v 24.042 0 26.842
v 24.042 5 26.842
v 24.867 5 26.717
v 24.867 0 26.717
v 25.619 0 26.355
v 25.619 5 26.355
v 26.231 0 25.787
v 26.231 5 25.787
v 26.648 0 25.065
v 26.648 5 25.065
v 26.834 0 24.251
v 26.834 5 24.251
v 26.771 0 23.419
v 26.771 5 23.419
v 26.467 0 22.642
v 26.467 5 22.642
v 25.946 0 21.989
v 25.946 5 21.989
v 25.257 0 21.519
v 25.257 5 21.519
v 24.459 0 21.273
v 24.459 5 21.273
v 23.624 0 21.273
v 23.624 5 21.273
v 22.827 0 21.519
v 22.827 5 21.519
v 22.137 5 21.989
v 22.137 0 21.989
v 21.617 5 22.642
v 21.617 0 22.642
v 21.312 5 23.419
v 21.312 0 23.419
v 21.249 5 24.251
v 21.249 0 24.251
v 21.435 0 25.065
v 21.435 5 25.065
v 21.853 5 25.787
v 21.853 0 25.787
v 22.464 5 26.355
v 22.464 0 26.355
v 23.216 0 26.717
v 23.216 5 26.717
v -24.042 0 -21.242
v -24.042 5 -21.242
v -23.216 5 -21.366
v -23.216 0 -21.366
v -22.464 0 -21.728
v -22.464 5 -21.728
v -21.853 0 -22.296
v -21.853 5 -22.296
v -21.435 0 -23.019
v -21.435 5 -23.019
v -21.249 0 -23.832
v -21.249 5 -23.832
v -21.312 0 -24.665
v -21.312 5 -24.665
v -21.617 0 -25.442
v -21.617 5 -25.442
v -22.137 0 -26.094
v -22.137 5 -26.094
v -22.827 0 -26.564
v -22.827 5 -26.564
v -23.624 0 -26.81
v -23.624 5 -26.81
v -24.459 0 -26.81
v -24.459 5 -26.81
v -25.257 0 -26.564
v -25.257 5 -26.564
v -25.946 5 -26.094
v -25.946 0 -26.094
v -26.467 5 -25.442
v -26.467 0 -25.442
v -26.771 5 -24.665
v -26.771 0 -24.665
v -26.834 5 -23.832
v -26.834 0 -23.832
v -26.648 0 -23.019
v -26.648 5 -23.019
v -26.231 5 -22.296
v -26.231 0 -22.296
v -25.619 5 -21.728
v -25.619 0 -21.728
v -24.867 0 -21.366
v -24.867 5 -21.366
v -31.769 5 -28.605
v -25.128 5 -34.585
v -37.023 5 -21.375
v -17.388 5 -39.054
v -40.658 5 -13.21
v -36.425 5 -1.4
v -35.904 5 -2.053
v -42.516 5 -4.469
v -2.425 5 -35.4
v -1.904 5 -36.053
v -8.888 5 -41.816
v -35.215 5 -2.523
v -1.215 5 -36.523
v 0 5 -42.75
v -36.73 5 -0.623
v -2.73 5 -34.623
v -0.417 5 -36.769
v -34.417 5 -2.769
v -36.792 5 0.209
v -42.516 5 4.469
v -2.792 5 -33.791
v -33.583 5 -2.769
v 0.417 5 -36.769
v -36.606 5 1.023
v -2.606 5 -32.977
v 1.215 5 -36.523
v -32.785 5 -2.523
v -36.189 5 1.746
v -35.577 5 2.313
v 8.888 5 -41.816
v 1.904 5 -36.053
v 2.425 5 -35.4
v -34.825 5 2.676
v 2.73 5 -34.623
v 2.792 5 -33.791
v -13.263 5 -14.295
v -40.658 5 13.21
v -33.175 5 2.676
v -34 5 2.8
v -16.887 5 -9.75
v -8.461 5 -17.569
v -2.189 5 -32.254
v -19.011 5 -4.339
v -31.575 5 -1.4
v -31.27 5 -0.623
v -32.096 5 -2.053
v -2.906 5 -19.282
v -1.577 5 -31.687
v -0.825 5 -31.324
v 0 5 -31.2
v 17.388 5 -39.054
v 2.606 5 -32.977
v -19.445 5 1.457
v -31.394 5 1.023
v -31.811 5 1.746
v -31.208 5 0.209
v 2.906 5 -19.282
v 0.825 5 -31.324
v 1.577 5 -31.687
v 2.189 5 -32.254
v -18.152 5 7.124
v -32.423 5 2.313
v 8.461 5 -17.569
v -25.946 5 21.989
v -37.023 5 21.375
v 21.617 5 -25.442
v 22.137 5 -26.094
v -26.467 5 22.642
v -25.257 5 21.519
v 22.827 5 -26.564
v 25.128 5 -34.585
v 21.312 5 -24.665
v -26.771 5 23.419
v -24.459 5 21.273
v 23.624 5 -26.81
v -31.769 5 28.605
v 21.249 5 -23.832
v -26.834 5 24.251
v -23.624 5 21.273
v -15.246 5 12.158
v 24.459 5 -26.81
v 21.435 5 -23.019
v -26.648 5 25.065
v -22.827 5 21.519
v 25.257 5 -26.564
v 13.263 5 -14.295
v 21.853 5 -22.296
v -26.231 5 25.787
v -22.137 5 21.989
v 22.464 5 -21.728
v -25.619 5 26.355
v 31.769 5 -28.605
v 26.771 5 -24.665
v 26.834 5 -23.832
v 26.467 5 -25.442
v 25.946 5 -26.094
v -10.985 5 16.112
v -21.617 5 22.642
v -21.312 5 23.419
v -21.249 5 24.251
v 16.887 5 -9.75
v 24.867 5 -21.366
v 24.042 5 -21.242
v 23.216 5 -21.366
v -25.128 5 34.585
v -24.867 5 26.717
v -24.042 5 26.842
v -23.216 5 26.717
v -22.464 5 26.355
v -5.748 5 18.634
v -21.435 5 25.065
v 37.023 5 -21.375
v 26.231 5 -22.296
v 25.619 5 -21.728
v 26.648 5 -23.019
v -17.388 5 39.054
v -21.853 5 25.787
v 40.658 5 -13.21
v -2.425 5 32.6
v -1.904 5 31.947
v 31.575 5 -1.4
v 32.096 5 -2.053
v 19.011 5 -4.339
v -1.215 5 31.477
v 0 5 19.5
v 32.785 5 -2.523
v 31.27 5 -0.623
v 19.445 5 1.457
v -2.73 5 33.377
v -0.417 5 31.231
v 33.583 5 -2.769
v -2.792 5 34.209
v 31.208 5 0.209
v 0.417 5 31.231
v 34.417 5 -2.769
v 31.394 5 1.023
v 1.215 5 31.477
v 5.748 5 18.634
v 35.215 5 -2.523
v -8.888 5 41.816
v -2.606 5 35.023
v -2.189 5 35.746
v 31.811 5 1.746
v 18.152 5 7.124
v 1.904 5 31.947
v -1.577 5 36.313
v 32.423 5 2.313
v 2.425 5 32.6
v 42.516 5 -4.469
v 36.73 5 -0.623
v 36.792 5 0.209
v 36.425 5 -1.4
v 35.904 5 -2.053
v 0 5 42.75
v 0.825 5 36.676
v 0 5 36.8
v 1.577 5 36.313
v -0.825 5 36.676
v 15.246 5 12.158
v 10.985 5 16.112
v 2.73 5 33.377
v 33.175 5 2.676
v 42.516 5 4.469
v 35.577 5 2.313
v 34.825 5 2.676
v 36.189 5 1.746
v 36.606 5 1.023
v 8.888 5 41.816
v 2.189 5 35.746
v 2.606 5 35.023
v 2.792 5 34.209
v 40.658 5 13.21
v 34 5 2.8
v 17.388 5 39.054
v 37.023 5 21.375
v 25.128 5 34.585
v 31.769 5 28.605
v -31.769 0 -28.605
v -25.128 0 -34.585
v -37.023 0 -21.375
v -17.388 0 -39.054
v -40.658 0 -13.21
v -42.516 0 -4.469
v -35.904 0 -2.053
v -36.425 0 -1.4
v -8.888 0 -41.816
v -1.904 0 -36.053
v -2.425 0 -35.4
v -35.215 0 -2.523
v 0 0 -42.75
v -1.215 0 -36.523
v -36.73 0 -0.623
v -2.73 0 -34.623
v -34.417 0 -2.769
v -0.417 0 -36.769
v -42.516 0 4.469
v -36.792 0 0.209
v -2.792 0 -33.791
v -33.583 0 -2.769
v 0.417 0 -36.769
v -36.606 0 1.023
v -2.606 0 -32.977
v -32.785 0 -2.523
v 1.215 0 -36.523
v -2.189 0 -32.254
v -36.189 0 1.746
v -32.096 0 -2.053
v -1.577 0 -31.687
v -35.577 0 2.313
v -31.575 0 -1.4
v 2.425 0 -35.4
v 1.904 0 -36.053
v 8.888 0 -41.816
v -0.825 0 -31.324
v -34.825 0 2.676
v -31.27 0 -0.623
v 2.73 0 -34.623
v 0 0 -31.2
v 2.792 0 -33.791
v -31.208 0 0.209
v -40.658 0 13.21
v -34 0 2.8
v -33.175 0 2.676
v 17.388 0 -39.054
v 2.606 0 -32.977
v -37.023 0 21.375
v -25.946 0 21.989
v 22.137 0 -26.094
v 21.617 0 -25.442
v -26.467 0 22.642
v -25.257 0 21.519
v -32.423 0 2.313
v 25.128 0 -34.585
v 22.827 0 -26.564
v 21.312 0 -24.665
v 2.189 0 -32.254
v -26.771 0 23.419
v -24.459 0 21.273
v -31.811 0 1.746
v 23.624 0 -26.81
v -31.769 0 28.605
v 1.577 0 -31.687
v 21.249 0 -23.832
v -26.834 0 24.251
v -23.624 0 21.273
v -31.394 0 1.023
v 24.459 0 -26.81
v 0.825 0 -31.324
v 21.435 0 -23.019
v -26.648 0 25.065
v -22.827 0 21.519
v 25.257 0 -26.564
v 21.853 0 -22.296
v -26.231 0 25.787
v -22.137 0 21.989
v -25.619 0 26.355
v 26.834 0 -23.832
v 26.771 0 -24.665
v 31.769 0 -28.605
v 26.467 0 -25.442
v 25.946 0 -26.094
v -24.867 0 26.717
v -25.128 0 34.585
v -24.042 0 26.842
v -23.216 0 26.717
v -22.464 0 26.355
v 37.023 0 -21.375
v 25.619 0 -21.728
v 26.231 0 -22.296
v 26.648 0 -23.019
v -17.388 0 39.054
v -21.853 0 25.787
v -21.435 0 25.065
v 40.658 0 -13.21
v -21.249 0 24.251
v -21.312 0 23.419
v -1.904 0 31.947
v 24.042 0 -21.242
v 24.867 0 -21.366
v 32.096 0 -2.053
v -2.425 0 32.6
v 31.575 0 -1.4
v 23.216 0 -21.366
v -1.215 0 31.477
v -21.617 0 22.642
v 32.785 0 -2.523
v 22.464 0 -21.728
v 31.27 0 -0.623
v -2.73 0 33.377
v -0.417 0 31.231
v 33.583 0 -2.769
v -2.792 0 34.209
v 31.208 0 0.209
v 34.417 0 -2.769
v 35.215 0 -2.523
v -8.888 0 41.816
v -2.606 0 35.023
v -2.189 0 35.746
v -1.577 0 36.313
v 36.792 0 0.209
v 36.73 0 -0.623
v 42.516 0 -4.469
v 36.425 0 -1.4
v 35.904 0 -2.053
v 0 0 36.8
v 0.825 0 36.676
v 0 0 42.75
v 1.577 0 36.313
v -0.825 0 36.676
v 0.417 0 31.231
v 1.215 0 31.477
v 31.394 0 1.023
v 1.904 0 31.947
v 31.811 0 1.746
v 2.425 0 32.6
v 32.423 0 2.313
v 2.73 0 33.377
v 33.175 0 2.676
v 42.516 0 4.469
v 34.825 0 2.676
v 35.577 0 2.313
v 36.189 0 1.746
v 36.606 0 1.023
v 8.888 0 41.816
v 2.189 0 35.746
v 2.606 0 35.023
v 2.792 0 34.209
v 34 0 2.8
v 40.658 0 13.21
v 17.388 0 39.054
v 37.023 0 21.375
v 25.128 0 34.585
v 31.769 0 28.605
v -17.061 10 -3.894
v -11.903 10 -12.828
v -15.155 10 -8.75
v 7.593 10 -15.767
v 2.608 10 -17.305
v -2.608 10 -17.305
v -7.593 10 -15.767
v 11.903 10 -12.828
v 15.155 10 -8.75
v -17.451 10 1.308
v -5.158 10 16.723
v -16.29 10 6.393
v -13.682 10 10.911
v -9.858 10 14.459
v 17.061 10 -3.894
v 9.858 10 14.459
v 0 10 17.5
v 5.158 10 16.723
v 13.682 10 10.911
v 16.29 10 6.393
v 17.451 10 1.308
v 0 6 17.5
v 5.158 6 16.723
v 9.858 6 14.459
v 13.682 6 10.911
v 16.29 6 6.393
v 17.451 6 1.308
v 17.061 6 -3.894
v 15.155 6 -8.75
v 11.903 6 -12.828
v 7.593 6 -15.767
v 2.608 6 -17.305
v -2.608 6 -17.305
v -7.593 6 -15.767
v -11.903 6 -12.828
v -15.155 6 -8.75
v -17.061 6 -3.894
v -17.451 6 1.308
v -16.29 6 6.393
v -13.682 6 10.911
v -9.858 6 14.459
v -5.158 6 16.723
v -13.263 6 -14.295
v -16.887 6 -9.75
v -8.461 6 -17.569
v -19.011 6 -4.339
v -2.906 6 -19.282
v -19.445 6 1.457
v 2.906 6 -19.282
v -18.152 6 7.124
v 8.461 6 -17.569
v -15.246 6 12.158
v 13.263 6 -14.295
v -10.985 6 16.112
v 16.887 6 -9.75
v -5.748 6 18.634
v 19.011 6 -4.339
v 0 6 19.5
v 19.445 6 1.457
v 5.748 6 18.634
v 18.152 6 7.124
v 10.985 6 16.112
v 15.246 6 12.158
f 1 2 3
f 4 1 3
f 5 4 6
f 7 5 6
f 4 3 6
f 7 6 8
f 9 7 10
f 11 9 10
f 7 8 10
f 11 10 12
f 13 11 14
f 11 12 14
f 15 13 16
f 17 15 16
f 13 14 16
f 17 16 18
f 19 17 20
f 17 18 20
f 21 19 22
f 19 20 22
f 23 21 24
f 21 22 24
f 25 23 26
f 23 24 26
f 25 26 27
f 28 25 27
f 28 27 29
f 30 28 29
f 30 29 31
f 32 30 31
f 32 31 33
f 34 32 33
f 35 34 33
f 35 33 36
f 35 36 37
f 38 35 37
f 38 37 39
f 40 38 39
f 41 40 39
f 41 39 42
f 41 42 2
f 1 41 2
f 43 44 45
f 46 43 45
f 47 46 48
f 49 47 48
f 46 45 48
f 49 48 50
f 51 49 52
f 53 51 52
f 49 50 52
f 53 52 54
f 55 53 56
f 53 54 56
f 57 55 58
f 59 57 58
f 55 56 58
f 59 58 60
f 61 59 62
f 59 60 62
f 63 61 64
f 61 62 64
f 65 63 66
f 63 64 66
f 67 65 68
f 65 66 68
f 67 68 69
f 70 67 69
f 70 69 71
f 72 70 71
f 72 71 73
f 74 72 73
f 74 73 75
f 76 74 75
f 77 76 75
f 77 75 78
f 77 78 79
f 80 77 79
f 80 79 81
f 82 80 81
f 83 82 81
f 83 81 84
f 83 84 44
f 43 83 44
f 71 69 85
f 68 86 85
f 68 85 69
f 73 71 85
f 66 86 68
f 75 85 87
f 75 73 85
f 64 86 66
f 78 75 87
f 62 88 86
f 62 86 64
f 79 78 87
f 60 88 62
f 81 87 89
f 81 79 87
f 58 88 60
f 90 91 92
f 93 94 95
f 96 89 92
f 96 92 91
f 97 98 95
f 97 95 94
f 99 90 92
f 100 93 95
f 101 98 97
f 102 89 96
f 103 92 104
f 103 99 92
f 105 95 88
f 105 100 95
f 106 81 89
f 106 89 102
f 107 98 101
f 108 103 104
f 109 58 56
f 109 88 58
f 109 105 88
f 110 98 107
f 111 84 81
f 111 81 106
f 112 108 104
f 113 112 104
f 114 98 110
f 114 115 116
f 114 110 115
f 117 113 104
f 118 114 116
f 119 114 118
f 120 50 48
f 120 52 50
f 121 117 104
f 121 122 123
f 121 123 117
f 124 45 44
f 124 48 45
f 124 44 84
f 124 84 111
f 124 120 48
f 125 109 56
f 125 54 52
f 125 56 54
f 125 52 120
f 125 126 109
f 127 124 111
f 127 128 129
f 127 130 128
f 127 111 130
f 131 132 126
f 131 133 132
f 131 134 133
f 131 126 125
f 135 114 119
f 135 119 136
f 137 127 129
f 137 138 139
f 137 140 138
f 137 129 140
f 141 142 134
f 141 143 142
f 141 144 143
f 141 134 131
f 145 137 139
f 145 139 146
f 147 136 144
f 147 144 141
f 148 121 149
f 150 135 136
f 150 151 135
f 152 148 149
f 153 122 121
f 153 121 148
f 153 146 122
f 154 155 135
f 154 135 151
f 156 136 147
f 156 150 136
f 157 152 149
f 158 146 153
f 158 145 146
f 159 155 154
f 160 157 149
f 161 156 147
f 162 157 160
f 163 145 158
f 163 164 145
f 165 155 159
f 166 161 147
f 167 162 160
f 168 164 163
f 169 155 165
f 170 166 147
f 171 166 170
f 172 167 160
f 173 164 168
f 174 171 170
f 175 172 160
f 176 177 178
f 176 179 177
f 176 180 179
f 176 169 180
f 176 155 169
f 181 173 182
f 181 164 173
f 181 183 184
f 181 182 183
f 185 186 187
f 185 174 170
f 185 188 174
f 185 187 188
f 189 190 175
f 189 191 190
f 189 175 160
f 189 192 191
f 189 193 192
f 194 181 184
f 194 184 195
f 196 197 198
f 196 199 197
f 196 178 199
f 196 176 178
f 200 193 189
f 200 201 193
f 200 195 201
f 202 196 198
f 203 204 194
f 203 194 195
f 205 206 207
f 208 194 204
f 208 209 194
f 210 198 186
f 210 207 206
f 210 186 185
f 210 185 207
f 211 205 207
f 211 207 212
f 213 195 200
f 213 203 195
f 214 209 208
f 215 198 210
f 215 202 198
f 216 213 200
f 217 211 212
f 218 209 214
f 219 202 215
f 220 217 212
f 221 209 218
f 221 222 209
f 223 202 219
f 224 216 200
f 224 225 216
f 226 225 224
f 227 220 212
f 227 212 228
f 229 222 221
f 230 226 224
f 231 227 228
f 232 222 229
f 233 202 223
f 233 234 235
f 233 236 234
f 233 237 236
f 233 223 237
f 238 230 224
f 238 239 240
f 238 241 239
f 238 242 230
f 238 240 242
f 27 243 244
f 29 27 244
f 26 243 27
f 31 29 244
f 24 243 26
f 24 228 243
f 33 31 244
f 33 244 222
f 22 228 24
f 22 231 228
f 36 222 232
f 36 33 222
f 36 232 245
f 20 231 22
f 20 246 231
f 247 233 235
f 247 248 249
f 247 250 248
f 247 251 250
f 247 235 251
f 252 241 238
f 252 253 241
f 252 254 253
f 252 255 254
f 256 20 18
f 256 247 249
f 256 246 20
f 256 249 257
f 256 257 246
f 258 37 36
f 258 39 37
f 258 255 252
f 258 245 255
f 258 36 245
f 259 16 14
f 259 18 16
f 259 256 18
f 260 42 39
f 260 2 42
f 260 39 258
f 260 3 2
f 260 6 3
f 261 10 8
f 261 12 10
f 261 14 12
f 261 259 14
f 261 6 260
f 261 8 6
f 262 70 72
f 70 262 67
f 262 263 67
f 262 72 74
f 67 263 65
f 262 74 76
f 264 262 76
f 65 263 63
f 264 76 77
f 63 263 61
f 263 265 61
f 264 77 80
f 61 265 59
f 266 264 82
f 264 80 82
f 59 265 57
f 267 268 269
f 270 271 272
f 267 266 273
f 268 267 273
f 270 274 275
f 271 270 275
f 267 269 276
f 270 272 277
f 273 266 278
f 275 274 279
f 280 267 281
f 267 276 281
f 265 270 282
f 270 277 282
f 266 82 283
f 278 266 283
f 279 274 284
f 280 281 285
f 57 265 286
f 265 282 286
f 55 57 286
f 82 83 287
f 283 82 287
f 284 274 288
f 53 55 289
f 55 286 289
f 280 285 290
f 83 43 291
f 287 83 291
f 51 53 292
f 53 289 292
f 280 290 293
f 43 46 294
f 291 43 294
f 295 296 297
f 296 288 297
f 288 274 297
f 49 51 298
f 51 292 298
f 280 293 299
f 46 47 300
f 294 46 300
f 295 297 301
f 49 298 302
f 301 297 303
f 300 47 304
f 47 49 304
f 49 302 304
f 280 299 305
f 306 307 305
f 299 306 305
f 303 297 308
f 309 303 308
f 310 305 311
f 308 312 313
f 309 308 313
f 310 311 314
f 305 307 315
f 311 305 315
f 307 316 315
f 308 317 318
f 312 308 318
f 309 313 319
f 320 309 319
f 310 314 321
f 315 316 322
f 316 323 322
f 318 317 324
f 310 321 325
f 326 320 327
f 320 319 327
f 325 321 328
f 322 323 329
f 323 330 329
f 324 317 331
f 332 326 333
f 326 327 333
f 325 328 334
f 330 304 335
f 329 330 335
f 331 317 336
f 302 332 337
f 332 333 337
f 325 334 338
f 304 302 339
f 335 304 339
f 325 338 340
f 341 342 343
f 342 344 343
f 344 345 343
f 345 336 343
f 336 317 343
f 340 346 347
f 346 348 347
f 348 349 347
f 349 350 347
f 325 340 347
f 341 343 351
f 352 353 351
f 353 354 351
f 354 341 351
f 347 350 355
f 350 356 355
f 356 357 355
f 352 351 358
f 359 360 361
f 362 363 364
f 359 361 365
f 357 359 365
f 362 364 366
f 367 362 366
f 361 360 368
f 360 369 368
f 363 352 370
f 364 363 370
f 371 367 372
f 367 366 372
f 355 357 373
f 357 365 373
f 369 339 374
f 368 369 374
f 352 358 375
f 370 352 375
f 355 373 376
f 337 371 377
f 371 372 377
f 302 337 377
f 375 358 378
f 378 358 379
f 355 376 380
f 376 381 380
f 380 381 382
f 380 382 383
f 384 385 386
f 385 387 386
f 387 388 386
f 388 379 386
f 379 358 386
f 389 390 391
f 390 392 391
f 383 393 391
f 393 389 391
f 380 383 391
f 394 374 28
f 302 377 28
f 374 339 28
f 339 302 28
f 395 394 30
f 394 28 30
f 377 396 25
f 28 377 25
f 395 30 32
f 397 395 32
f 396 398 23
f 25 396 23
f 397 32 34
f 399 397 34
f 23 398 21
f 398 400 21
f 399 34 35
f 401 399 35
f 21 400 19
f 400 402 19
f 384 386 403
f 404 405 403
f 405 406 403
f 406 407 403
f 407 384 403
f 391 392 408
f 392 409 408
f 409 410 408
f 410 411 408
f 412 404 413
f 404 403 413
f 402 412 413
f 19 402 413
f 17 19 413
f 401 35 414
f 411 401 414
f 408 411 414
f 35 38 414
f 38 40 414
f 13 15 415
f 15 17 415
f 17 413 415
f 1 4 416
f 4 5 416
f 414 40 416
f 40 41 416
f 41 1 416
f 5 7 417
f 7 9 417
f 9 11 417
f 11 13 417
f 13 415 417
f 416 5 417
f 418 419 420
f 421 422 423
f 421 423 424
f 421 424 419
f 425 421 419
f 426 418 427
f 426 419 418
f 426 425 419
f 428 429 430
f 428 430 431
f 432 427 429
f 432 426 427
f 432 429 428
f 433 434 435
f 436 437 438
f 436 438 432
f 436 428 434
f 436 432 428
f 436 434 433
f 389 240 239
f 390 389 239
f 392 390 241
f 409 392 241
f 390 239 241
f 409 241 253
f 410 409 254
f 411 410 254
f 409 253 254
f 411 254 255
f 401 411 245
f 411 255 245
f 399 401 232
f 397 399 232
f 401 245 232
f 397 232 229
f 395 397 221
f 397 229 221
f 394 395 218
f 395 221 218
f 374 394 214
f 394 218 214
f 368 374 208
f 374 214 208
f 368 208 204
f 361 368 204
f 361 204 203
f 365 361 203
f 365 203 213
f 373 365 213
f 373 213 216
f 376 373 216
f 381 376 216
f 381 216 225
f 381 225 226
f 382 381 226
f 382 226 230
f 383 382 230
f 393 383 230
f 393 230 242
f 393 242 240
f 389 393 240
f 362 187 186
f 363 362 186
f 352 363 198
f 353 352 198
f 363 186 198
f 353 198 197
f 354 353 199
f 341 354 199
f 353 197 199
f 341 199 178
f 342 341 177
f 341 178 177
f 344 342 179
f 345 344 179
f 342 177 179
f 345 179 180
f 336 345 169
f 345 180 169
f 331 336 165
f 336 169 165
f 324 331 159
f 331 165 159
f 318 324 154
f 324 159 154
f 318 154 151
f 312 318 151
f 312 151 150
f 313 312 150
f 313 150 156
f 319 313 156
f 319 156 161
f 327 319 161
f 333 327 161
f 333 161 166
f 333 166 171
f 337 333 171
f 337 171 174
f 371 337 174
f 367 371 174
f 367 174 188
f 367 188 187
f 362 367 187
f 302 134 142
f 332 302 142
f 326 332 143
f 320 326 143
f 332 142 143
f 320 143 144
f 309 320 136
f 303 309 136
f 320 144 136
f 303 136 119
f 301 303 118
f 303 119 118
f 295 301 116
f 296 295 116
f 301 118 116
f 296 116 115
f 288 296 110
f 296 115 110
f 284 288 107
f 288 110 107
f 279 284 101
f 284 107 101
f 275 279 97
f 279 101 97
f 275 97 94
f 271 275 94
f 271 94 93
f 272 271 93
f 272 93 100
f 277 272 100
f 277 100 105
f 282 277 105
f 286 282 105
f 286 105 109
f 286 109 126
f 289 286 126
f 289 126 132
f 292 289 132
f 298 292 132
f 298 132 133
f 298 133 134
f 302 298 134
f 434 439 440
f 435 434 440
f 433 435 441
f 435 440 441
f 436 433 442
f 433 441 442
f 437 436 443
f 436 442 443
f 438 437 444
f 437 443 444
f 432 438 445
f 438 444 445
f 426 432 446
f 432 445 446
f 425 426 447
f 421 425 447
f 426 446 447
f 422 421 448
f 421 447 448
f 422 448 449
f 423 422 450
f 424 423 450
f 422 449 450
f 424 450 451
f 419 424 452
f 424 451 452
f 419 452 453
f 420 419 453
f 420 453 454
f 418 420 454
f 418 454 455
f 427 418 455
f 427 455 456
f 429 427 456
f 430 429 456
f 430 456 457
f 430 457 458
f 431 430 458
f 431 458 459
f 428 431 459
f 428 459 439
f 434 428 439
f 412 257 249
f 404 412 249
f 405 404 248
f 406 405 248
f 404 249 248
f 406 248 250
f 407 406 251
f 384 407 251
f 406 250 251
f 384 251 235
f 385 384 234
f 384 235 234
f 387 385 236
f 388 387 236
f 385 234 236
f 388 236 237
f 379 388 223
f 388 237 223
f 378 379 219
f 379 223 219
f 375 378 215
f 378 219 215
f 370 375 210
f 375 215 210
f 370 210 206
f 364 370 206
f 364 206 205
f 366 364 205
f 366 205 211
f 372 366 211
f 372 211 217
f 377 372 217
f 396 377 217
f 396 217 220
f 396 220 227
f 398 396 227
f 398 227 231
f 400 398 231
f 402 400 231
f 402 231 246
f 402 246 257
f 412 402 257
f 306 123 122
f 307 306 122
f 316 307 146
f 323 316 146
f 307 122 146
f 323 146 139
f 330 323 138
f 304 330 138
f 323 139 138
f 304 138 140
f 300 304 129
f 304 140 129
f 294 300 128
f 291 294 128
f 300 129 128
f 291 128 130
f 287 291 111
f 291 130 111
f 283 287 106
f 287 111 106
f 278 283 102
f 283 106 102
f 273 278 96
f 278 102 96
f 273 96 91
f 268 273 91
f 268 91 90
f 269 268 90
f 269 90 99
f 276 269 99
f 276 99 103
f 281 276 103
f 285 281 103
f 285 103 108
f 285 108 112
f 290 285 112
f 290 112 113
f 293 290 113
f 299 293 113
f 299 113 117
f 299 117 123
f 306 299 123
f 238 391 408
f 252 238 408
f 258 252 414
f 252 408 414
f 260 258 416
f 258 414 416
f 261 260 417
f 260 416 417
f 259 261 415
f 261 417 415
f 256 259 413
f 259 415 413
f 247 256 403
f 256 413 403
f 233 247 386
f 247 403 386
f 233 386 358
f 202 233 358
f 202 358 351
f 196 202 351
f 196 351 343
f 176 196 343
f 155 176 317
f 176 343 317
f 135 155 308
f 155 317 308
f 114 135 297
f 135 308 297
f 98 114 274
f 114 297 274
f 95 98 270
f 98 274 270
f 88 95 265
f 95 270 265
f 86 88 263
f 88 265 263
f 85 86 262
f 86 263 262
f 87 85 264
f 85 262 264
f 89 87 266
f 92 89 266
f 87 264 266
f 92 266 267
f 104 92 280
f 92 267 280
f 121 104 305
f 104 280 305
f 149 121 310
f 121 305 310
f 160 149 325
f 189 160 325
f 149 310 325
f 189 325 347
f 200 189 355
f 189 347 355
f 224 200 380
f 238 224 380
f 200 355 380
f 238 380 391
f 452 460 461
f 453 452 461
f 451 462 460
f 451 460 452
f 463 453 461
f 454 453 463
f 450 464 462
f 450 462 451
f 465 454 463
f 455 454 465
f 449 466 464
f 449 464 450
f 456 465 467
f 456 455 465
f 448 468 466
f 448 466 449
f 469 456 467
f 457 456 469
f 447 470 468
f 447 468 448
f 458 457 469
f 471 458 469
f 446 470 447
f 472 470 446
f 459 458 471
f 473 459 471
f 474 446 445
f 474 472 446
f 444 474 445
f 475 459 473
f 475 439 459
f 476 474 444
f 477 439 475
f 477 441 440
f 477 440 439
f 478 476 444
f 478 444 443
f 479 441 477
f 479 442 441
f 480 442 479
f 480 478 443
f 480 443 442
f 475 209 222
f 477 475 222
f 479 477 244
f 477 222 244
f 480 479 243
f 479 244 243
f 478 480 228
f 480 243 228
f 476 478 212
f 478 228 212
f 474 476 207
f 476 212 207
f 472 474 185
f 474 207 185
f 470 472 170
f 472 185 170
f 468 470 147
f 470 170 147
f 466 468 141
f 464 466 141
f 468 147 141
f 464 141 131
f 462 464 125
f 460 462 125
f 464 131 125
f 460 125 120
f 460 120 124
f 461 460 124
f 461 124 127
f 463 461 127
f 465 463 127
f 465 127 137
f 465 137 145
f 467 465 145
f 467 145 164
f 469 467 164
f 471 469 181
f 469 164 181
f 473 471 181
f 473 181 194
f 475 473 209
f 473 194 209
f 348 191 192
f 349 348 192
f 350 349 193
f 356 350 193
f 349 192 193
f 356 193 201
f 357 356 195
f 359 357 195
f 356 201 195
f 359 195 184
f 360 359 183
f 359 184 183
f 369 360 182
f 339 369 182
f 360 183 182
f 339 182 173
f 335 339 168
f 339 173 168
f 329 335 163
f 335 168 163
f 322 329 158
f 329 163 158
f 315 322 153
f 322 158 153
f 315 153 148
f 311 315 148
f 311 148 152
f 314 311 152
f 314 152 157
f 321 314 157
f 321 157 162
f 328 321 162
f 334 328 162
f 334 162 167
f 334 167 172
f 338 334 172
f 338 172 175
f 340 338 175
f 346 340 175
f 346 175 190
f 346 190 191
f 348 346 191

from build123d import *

# Parameters (mm, degrees)
SKETCH1_R           = 42.75
BOSS_EXTRUDE1_DEPTH = 5
SKETCH2_R           = 2.8
CUT_EXTRUDE1_DEPTH  = 61.664033826
SKETCH3_R           = 17.5
BOSS_EXTRUDE2_DEPTH = 5
SKETCH4_R           = 19.5
BOSS_EXTRUDE3_DEPTH = 1


with BuildPart() as part:
    # Sketch1 → Boss-Extrude1 (new body)
    with BuildSketch(Plane(origin=(0, 0, 0), x_dir=(1, 0, 0), z_dir=(0, 1, 0))):
        with Locations(Location((0, 0, 0), (0, 0, 270))):
            Circle(SKETCH1_R)
    extrude(amount=BOSS_EXTRUDE1_DEPTH)

    # Sketch2 → Cut-Extrude1 (cut, through all)
    with BuildSketch(Plane(origin=(0, 5, 0), x_dir=(1, 0, 0), z_dir=(0, 1, 0))):
        with Locations(Location((0, 34, 0), (0, 0, 270))):
            Circle(SKETCH2_R)
        with Locations(Location((24.04163056, 24.04163056, 0), (0, 0, 270))):
            Circle(SKETCH2_R)
        with Locations(Location((34, 0, 0), (0, 0, 270))):
            Circle(SKETCH2_R)
        with Locations(Location((24.04163056, -24.04163056, 0), (0, 0, 270))):
            Circle(SKETCH2_R)
        with Locations(Location((0, -34, 0), (0, 0, 270))):
            Circle(SKETCH2_R)
        with Locations(Location((-24.04163056, -24.04163056, 0), (0, 0, 270))):
            Circle(SKETCH2_R)
        with Locations(Location((-34, 0, 0), (0, 0, 270))):
            Circle(SKETCH2_R)
        with Locations(Location((-24.04163056, 24.04163056, 0), (0, 0, 270))):
            Circle(SKETCH2_R)
    extrude(amount=-CUT_EXTRUDE1_DEPTH, mode=Mode.SUBTRACT)

    # Sketch3 → Boss-Extrude2 (add)
    with BuildSketch(Plane(origin=(0, 5, 0), x_dir=(1, 0, 0), z_dir=(0, 1, 0))):
        with Locations(Location((0, 0, 0), (0, 0, 270))):
            Circle(SKETCH3_R)
    extrude(amount=BOSS_EXTRUDE2_DEPTH)

    # Sketch4 → Boss-Extrude3 (add)
    with BuildSketch(Plane(origin=(0, 5, 0), x_dir=(1, 0, 0), z_dir=(0, 1, 0))):
        with Locations(Location((0, 0, 0), (0, 0, 270))):
            Circle(SKETCH4_R)
    extrude(amount=BOSS_EXTRUDE3_DEPTH)


solid = part.part
